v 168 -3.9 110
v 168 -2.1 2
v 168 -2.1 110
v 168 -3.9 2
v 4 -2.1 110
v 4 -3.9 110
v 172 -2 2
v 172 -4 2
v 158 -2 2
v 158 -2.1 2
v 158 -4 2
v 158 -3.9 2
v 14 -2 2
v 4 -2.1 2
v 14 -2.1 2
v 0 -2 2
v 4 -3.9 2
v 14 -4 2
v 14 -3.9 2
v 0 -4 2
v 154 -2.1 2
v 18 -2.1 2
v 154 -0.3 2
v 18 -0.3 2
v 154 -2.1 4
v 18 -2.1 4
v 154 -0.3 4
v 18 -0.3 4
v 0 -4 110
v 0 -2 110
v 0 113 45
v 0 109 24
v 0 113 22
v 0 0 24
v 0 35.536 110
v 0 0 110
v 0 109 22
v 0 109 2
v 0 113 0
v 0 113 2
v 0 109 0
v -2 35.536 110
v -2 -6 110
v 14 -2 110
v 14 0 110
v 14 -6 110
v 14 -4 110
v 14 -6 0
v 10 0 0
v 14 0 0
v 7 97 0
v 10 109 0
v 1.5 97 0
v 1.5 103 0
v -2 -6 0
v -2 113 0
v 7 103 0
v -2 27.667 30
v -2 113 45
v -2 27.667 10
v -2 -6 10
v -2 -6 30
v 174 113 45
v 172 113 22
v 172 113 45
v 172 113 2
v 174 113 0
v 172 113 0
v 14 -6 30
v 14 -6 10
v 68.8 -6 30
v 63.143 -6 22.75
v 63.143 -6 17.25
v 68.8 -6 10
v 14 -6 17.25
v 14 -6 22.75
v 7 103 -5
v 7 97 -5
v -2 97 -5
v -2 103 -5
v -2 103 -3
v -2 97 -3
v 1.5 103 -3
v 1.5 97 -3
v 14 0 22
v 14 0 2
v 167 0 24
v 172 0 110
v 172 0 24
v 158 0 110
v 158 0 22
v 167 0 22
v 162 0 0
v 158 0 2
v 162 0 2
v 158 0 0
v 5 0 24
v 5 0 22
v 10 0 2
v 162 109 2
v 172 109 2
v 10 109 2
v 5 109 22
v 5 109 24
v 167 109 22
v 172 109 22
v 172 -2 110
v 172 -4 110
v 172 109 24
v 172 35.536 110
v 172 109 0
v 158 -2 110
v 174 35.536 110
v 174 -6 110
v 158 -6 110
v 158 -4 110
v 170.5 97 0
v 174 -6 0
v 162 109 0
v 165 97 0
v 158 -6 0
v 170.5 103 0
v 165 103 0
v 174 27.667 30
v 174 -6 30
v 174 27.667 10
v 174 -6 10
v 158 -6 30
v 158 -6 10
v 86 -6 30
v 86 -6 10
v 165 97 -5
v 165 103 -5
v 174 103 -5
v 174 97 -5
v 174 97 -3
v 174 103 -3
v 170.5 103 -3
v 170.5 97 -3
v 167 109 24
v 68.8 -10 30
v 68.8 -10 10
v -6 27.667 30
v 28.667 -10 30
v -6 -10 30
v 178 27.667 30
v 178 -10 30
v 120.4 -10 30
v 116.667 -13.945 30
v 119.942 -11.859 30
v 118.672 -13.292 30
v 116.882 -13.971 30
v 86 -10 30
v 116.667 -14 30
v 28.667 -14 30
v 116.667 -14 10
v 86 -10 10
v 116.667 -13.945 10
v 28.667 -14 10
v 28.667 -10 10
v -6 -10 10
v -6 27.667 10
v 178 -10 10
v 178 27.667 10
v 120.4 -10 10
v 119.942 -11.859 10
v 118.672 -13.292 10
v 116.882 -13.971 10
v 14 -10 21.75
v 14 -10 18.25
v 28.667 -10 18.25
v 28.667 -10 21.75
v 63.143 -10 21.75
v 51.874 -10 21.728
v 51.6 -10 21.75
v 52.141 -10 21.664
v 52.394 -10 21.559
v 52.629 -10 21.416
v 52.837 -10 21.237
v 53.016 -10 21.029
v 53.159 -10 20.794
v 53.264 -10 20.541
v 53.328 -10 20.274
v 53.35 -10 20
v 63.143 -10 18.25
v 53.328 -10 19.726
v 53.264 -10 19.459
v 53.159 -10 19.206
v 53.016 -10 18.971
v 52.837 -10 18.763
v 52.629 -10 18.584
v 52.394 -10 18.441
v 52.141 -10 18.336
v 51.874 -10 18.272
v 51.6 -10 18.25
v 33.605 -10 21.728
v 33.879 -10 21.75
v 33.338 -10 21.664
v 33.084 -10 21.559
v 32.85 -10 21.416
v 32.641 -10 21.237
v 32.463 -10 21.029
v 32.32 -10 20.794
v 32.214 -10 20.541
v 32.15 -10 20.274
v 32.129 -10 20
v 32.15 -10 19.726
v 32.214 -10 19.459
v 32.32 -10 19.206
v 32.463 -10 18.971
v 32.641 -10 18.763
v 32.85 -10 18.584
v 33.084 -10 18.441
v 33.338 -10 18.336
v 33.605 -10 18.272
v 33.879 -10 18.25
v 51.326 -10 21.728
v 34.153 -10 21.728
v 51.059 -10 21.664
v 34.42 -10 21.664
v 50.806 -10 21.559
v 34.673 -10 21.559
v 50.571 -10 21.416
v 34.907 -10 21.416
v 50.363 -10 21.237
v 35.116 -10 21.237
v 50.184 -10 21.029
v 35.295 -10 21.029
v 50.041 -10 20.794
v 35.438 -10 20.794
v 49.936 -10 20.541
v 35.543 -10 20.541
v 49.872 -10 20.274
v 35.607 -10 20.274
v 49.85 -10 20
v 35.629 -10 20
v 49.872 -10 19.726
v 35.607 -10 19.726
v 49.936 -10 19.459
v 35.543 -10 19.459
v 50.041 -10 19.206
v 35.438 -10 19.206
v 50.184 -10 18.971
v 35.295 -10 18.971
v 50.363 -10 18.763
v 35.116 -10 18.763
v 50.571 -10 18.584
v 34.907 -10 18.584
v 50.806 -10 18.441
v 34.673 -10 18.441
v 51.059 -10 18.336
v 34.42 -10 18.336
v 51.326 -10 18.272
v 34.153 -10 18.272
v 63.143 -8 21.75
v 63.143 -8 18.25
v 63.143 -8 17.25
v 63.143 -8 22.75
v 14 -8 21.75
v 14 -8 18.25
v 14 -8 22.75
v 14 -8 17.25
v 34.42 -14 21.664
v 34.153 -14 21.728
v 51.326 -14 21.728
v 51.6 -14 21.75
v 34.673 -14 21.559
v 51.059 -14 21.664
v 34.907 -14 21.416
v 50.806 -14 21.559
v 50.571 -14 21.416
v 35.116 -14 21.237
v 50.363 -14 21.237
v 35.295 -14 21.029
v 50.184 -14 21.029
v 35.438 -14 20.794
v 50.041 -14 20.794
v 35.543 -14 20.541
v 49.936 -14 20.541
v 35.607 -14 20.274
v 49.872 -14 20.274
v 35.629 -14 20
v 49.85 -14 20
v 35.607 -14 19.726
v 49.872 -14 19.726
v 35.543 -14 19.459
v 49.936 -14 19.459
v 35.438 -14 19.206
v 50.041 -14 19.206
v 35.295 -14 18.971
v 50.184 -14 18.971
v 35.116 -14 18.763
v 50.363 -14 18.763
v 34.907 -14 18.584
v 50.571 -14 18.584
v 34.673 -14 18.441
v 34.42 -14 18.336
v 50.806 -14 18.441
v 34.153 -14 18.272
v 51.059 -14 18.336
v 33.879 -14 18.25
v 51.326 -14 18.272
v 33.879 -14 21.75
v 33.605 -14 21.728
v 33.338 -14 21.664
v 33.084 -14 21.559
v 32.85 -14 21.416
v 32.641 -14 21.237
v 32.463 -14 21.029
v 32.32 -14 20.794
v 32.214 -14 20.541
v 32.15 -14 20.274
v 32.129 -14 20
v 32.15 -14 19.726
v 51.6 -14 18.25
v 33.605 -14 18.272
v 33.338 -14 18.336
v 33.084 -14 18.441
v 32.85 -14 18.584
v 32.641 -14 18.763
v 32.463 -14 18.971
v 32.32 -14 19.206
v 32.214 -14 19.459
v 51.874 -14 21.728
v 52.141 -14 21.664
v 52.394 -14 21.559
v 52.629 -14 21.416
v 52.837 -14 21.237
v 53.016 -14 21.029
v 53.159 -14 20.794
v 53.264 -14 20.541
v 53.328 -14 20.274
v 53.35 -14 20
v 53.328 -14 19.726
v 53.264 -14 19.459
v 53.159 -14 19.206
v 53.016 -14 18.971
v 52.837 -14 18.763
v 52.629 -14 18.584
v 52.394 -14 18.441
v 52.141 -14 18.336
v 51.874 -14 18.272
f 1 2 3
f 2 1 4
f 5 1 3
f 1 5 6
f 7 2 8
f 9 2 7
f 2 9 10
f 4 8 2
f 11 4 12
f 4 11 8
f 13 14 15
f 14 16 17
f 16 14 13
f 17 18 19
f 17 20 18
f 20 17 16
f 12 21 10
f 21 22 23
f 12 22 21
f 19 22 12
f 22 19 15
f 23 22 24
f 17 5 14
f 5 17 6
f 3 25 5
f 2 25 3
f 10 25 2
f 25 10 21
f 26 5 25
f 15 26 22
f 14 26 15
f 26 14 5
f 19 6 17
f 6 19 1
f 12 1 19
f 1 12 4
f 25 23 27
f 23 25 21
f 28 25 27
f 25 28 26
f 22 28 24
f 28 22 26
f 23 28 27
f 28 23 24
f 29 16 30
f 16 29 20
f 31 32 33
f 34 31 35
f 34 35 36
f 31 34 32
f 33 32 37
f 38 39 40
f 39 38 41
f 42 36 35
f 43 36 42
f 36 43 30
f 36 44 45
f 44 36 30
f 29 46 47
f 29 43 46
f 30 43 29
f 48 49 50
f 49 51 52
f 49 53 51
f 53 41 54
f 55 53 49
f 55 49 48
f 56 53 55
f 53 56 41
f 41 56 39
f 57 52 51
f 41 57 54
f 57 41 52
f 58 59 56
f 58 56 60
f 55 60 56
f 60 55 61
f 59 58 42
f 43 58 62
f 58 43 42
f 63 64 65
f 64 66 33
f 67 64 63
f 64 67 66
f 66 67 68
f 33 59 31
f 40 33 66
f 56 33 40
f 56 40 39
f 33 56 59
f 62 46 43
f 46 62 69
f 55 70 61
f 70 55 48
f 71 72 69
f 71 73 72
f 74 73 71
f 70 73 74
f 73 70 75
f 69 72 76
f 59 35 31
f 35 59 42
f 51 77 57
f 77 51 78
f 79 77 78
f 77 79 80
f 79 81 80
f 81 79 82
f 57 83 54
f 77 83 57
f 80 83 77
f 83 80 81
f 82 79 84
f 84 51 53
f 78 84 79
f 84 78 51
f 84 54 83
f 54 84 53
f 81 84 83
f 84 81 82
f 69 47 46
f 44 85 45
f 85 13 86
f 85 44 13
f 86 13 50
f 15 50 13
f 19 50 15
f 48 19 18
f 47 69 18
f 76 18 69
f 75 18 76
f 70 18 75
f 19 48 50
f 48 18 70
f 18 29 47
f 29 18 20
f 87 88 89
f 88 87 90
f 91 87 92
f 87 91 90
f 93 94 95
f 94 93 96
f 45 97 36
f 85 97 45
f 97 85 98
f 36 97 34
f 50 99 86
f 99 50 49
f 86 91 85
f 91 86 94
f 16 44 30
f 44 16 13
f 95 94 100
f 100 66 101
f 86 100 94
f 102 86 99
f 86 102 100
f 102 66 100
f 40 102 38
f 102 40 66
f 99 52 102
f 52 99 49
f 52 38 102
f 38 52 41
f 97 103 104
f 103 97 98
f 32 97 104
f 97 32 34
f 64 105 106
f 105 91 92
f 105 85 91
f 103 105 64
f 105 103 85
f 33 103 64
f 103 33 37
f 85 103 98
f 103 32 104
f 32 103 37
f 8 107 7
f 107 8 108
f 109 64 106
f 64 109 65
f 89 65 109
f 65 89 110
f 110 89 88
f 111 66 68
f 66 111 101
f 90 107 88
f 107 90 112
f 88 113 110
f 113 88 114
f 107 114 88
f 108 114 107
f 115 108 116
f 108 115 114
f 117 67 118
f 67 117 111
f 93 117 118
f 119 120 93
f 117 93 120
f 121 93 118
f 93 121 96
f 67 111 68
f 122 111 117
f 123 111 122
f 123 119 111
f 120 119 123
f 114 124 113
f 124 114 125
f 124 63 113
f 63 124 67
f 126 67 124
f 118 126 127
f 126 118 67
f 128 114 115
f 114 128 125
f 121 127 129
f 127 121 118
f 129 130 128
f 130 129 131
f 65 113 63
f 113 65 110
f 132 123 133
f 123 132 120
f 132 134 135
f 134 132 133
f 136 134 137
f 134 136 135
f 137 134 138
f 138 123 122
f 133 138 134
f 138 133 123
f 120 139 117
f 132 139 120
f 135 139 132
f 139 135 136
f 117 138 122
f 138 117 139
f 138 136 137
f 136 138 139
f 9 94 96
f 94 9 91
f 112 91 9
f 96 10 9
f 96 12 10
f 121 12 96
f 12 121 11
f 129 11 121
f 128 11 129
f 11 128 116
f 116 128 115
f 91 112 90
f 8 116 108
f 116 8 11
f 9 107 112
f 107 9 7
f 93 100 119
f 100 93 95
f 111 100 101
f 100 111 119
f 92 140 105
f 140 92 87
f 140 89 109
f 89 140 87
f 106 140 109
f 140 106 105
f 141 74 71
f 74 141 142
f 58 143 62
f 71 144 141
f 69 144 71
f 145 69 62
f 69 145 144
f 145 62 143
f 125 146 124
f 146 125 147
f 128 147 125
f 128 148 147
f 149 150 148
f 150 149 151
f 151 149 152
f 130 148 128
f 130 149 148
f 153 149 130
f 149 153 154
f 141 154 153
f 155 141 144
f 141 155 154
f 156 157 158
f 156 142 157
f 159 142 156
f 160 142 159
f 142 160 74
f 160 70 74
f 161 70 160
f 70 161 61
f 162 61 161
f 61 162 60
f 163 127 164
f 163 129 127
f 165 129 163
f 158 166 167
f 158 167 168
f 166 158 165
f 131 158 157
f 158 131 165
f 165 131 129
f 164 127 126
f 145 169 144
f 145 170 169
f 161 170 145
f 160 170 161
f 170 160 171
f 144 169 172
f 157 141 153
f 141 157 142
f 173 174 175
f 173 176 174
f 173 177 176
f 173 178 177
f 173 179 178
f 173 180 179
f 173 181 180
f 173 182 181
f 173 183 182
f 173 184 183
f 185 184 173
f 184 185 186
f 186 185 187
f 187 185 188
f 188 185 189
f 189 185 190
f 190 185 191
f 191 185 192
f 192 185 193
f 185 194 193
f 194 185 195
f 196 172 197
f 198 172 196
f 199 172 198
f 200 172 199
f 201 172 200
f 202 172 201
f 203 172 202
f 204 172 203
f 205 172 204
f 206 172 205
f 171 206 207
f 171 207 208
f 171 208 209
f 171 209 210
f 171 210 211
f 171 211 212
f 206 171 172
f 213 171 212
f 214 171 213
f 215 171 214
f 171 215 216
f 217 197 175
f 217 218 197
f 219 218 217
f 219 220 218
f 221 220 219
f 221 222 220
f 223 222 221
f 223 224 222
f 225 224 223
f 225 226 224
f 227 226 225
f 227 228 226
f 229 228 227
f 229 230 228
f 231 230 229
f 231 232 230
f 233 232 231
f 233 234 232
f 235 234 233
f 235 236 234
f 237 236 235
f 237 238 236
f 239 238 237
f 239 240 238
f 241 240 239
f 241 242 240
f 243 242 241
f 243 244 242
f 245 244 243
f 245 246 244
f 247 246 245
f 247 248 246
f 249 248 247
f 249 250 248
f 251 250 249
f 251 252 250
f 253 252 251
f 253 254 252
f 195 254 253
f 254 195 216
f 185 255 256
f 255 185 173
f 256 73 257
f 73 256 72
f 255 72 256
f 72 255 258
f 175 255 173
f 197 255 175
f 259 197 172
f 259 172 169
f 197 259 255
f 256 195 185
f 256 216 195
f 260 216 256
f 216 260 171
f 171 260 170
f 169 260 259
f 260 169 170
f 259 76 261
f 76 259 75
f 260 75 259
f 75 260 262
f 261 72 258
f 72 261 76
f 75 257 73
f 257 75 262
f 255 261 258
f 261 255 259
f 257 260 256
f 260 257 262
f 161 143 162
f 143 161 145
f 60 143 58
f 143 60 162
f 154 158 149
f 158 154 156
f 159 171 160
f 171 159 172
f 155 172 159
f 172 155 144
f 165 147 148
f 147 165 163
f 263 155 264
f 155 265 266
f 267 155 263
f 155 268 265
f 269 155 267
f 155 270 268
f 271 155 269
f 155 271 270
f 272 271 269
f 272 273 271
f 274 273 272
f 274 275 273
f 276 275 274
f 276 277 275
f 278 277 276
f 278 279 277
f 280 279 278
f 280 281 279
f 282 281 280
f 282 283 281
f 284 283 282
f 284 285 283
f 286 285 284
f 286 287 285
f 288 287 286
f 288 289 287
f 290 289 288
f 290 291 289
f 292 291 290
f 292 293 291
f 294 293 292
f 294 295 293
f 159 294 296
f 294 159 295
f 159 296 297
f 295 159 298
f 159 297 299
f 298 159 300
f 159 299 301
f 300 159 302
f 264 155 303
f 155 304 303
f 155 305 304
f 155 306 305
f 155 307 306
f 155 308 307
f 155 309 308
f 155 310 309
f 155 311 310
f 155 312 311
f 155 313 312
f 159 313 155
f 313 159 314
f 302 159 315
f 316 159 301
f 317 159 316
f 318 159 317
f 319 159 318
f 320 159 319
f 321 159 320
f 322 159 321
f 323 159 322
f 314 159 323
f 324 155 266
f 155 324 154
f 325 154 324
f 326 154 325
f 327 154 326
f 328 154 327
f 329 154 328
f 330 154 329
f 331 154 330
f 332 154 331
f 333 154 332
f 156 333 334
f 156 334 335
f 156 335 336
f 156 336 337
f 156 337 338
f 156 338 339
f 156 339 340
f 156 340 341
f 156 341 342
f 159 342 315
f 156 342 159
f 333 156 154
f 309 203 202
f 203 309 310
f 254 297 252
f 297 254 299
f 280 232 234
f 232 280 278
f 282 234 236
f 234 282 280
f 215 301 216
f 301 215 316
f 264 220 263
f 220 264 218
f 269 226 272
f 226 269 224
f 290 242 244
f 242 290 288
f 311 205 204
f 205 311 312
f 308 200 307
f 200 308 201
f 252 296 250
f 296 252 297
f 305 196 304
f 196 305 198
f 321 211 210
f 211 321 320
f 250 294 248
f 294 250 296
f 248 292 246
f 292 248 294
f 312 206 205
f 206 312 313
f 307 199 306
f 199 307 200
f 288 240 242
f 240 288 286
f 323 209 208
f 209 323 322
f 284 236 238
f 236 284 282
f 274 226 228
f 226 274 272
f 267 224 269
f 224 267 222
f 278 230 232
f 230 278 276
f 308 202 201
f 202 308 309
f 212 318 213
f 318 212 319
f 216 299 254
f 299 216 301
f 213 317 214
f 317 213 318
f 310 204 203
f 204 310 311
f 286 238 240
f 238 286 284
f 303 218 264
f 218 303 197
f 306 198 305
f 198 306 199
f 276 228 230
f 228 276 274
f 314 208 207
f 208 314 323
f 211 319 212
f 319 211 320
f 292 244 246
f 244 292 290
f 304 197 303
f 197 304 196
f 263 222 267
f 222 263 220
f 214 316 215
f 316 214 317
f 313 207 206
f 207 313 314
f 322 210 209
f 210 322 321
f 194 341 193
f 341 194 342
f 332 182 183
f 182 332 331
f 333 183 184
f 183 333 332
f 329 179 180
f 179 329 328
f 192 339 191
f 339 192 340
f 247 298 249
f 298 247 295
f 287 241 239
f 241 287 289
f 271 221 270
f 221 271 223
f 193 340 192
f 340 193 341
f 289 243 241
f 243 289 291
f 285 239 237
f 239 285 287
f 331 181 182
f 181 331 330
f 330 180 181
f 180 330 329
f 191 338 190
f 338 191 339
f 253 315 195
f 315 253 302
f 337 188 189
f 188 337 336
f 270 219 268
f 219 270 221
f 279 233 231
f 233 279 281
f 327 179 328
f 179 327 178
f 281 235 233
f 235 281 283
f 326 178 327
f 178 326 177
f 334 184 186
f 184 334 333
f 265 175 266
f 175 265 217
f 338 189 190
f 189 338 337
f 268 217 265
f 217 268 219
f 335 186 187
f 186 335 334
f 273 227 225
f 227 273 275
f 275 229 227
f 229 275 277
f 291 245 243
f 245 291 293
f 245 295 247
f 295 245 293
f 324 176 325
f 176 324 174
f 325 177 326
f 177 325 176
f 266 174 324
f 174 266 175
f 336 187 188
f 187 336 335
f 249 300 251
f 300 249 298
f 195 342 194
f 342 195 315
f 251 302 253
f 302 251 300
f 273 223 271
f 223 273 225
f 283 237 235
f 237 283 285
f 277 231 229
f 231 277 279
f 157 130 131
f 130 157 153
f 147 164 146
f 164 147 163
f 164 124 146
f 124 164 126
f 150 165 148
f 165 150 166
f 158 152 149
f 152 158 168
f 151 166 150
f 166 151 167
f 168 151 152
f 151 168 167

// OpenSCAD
/* [Monitor] */

Monitor_Width = 172;
Monitor_Height = 113;
Monitor_Depth = 20;

/* [Shield] */

// Which part would you like to see?
part = 6;  //[1:Top, 2:Left Side, 3:Right Side, 4:Clip Part 1, 5:Clip part 2, 6:Everything togheter]

// Shield Height
Shield_Height = 90; // [60:150]
// Because of my printer´s limitation, i had to limit the width of the top cover, use this to configure it
Shield_Cover_Width = 164;
Monitor_Top_Lock_Tab_Width = 5;
Monitor_Bottom_Lock_Tab_Width = 10;
// Tickness of all walls, 2 is good enough
Shield_Tickness = 2; //[2:4]

/* [Hidden] */

lockerSize = 14;
clipHeight = 20;
screwDiameter = 3.5;
screwCapDiameter = 5.5;

if(part < 6){
/*
Use this function to export the parts
1 = Top;
2 = Left Side;
3 = Right Side;
4 = Clip Part 1;
3 = Clip part 2;
*/
print(part);
}else{
// Use this function to see how everything looks like togheter 
BuildEverythings();
}



module print(piece){
    if (piece == 1)
        rotate([90,0,0]) top();
    
    if (piece == 2)
        rotate([0,90,0]) left();
    
    if (piece == 3)
        rotate([0,-90,0]) right();
    
    if (piece == 4)
        clipLeft();
   
    if (piece == 5)
        clipRight();
}

module BuildEverythings(){
#translate([0,0,Shield_Tickness]) monitor();
color([0.5,0.5,1]) translate([4,-Shield_Tickness * 2 + Shield_Tickness * 0.05,Shield_Tickness]) top();
color([0.2,0.5,0.6]) translate([-Shield_Tickness,-Shield_Tickness * 3,0]) right();
color([0.2,0.5,0.6]) translate([Monitor_Width + Shield_Tickness,-Shield_Tickness * 3,0]) left();
    translate([-(Shield_Tickness * 3),-(Shield_Tickness * 5),10]) adjustableClips();
}

module monitor(){
    cube([Monitor_Width, Monitor_Height,Monitor_Depth]);
}

module top(){
    cube([Shield_Cover_Width,Shield_Tickness * 0.9,Shield_Height + Monitor_Depth - Shield_Tickness]);
    translate([lockerSize,Shield_Tickness * 0.90,0]) cube([Shield_Cover_Width - lockerSize * 2,Shield_Tickness * 0.9, Shield_Tickness]);
}

module right(){
    difference(){
        cube([Shield_Tickness,Monitor_Height + Shield_Tickness * 3,Shield_Height + Monitor_Depth]);
        translate([-0.5,Monitor_Height + Shield_Tickness * 3,Monitor_Depth + Shield_Height/2 - 20]) rotate([50,0,0])  cube([Shield_Tickness+1, Monitor_Height, Shield_Height * 3]);
    }
    
    // Top lockers
    translate([Shield_Tickness,0,0]) cube([lockerSize,Shield_Tickness,Shield_Height + Monitor_Depth]);
    translate([Shield_Tickness,Shield_Tickness * 2,0]) cube([lockerSize,Shield_Tickness,Shield_Height + Monitor_Depth]);
    translate([Shield_Tickness,Shield_Tickness,0]) cube([lockerSize,Shield_Tickness,Shield_Tickness]);
    
    // Monitor Lockers
    translate([Shield_Tickness,Shield_Tickness,0]) cube([Monitor_Bottom_Lock_Tab_Width,Monitor_Height,Shield_Tickness]);
    translate([Shield_Tickness,Shield_Tickness * 2,Monitor_Depth + Shield_Tickness]) cube([Monitor_Top_Lock_Tab_Width,Monitor_Height - Shield_Tickness,Shield_Tickness]);
    
    // Rubber locker
    difference(){
        translate([0,Monitor_Height - 10,-5]) cube([9,6,5]);
        translate([-0.5,Monitor_Height - 10.5,-3]) cube([4,7,5.5]);
    }
}

module left(){
    mirror([1,0,0]) right();
}

module adjustableClips(){
   
   clipRight();
   translate([(Monitor_Width -  Monitor_Width / 2 + Shield_Tickness * 3) ,0,0])clipLeft();
   
}

module clipLeft(){
        cube([Monitor_Width / 2 +Shield_Tickness , Shield_Tickness * 2, clipHeight]);
    translate([Monitor_Width / 2 +Shield_Tickness ,0,0])  cube([Shield_Tickness * 2, Monitor_Height/3, clipHeight]) ; 
    difference(){
        translate([-(Monitor_Width / 3),-(Shield_Tickness * 2),0]) cube([Monitor_Width / 2 +Shield_Tickness , Shield_Tickness * 2, clipHeight]);
    
        translate([-(Monitor_Width / 3.3),0.5,clipHeight/2]) rotate([90,0,0]) cylinder(d = screwDiameter, h = Shield_Tickness * 2 + 1, $fn = 40) ;
        
        translate([-(Monitor_Width / 5),0.5,clipHeight/2]) rotate([90,0,0]) cylinder(d = screwDiameter, h = Shield_Tickness * 2 + 1, $fn = 40) ;
    }
    translate([Monitor_Width / 5 - Shield_Tickness * 2,0,0]) cylinder(h= clipHeight, r= Shield_Tickness * 2);
}

module clipRight(){
    difference(){
        translate([Shield_Tickness * 2,0,0]) cube([Monitor_Width / 2.5 + Shield_Tickness , Shield_Tickness * 2, clipHeight]) ;
        
    translate([20,-0.5,(clipHeight - screwDiameter) / 2 ]) cube([Monitor_Width / 3.5,Shield_Tickness * 2 + 1, screwDiameter]);
        
        translate([20,Shield_Tickness * 2 - 2,(clipHeight - screwCapDiameter) / 2 ]) cube([Monitor_Width / 3.5,2.1, screwCapDiameter]);
    }
    cube([Shield_Tickness * 2, Monitor_Height/3, clipHeight]) ;
}

module roundedcube(xdim ,ydim ,zdim,rdim){
hull(){
translate([rdim,rdim,0])cylinder(h=zdim,r=rdim);
translate([xdim-rdim,rdim,0])cylinder(h=zdim,r=rdim);

translate([rdim,ydim-rdim,0])cylinder(h=zdim,r=rdim);
translate([xdim-rdim,ydim-rdim,0])cylinder(h=zdim,r=rdim);
}
}
